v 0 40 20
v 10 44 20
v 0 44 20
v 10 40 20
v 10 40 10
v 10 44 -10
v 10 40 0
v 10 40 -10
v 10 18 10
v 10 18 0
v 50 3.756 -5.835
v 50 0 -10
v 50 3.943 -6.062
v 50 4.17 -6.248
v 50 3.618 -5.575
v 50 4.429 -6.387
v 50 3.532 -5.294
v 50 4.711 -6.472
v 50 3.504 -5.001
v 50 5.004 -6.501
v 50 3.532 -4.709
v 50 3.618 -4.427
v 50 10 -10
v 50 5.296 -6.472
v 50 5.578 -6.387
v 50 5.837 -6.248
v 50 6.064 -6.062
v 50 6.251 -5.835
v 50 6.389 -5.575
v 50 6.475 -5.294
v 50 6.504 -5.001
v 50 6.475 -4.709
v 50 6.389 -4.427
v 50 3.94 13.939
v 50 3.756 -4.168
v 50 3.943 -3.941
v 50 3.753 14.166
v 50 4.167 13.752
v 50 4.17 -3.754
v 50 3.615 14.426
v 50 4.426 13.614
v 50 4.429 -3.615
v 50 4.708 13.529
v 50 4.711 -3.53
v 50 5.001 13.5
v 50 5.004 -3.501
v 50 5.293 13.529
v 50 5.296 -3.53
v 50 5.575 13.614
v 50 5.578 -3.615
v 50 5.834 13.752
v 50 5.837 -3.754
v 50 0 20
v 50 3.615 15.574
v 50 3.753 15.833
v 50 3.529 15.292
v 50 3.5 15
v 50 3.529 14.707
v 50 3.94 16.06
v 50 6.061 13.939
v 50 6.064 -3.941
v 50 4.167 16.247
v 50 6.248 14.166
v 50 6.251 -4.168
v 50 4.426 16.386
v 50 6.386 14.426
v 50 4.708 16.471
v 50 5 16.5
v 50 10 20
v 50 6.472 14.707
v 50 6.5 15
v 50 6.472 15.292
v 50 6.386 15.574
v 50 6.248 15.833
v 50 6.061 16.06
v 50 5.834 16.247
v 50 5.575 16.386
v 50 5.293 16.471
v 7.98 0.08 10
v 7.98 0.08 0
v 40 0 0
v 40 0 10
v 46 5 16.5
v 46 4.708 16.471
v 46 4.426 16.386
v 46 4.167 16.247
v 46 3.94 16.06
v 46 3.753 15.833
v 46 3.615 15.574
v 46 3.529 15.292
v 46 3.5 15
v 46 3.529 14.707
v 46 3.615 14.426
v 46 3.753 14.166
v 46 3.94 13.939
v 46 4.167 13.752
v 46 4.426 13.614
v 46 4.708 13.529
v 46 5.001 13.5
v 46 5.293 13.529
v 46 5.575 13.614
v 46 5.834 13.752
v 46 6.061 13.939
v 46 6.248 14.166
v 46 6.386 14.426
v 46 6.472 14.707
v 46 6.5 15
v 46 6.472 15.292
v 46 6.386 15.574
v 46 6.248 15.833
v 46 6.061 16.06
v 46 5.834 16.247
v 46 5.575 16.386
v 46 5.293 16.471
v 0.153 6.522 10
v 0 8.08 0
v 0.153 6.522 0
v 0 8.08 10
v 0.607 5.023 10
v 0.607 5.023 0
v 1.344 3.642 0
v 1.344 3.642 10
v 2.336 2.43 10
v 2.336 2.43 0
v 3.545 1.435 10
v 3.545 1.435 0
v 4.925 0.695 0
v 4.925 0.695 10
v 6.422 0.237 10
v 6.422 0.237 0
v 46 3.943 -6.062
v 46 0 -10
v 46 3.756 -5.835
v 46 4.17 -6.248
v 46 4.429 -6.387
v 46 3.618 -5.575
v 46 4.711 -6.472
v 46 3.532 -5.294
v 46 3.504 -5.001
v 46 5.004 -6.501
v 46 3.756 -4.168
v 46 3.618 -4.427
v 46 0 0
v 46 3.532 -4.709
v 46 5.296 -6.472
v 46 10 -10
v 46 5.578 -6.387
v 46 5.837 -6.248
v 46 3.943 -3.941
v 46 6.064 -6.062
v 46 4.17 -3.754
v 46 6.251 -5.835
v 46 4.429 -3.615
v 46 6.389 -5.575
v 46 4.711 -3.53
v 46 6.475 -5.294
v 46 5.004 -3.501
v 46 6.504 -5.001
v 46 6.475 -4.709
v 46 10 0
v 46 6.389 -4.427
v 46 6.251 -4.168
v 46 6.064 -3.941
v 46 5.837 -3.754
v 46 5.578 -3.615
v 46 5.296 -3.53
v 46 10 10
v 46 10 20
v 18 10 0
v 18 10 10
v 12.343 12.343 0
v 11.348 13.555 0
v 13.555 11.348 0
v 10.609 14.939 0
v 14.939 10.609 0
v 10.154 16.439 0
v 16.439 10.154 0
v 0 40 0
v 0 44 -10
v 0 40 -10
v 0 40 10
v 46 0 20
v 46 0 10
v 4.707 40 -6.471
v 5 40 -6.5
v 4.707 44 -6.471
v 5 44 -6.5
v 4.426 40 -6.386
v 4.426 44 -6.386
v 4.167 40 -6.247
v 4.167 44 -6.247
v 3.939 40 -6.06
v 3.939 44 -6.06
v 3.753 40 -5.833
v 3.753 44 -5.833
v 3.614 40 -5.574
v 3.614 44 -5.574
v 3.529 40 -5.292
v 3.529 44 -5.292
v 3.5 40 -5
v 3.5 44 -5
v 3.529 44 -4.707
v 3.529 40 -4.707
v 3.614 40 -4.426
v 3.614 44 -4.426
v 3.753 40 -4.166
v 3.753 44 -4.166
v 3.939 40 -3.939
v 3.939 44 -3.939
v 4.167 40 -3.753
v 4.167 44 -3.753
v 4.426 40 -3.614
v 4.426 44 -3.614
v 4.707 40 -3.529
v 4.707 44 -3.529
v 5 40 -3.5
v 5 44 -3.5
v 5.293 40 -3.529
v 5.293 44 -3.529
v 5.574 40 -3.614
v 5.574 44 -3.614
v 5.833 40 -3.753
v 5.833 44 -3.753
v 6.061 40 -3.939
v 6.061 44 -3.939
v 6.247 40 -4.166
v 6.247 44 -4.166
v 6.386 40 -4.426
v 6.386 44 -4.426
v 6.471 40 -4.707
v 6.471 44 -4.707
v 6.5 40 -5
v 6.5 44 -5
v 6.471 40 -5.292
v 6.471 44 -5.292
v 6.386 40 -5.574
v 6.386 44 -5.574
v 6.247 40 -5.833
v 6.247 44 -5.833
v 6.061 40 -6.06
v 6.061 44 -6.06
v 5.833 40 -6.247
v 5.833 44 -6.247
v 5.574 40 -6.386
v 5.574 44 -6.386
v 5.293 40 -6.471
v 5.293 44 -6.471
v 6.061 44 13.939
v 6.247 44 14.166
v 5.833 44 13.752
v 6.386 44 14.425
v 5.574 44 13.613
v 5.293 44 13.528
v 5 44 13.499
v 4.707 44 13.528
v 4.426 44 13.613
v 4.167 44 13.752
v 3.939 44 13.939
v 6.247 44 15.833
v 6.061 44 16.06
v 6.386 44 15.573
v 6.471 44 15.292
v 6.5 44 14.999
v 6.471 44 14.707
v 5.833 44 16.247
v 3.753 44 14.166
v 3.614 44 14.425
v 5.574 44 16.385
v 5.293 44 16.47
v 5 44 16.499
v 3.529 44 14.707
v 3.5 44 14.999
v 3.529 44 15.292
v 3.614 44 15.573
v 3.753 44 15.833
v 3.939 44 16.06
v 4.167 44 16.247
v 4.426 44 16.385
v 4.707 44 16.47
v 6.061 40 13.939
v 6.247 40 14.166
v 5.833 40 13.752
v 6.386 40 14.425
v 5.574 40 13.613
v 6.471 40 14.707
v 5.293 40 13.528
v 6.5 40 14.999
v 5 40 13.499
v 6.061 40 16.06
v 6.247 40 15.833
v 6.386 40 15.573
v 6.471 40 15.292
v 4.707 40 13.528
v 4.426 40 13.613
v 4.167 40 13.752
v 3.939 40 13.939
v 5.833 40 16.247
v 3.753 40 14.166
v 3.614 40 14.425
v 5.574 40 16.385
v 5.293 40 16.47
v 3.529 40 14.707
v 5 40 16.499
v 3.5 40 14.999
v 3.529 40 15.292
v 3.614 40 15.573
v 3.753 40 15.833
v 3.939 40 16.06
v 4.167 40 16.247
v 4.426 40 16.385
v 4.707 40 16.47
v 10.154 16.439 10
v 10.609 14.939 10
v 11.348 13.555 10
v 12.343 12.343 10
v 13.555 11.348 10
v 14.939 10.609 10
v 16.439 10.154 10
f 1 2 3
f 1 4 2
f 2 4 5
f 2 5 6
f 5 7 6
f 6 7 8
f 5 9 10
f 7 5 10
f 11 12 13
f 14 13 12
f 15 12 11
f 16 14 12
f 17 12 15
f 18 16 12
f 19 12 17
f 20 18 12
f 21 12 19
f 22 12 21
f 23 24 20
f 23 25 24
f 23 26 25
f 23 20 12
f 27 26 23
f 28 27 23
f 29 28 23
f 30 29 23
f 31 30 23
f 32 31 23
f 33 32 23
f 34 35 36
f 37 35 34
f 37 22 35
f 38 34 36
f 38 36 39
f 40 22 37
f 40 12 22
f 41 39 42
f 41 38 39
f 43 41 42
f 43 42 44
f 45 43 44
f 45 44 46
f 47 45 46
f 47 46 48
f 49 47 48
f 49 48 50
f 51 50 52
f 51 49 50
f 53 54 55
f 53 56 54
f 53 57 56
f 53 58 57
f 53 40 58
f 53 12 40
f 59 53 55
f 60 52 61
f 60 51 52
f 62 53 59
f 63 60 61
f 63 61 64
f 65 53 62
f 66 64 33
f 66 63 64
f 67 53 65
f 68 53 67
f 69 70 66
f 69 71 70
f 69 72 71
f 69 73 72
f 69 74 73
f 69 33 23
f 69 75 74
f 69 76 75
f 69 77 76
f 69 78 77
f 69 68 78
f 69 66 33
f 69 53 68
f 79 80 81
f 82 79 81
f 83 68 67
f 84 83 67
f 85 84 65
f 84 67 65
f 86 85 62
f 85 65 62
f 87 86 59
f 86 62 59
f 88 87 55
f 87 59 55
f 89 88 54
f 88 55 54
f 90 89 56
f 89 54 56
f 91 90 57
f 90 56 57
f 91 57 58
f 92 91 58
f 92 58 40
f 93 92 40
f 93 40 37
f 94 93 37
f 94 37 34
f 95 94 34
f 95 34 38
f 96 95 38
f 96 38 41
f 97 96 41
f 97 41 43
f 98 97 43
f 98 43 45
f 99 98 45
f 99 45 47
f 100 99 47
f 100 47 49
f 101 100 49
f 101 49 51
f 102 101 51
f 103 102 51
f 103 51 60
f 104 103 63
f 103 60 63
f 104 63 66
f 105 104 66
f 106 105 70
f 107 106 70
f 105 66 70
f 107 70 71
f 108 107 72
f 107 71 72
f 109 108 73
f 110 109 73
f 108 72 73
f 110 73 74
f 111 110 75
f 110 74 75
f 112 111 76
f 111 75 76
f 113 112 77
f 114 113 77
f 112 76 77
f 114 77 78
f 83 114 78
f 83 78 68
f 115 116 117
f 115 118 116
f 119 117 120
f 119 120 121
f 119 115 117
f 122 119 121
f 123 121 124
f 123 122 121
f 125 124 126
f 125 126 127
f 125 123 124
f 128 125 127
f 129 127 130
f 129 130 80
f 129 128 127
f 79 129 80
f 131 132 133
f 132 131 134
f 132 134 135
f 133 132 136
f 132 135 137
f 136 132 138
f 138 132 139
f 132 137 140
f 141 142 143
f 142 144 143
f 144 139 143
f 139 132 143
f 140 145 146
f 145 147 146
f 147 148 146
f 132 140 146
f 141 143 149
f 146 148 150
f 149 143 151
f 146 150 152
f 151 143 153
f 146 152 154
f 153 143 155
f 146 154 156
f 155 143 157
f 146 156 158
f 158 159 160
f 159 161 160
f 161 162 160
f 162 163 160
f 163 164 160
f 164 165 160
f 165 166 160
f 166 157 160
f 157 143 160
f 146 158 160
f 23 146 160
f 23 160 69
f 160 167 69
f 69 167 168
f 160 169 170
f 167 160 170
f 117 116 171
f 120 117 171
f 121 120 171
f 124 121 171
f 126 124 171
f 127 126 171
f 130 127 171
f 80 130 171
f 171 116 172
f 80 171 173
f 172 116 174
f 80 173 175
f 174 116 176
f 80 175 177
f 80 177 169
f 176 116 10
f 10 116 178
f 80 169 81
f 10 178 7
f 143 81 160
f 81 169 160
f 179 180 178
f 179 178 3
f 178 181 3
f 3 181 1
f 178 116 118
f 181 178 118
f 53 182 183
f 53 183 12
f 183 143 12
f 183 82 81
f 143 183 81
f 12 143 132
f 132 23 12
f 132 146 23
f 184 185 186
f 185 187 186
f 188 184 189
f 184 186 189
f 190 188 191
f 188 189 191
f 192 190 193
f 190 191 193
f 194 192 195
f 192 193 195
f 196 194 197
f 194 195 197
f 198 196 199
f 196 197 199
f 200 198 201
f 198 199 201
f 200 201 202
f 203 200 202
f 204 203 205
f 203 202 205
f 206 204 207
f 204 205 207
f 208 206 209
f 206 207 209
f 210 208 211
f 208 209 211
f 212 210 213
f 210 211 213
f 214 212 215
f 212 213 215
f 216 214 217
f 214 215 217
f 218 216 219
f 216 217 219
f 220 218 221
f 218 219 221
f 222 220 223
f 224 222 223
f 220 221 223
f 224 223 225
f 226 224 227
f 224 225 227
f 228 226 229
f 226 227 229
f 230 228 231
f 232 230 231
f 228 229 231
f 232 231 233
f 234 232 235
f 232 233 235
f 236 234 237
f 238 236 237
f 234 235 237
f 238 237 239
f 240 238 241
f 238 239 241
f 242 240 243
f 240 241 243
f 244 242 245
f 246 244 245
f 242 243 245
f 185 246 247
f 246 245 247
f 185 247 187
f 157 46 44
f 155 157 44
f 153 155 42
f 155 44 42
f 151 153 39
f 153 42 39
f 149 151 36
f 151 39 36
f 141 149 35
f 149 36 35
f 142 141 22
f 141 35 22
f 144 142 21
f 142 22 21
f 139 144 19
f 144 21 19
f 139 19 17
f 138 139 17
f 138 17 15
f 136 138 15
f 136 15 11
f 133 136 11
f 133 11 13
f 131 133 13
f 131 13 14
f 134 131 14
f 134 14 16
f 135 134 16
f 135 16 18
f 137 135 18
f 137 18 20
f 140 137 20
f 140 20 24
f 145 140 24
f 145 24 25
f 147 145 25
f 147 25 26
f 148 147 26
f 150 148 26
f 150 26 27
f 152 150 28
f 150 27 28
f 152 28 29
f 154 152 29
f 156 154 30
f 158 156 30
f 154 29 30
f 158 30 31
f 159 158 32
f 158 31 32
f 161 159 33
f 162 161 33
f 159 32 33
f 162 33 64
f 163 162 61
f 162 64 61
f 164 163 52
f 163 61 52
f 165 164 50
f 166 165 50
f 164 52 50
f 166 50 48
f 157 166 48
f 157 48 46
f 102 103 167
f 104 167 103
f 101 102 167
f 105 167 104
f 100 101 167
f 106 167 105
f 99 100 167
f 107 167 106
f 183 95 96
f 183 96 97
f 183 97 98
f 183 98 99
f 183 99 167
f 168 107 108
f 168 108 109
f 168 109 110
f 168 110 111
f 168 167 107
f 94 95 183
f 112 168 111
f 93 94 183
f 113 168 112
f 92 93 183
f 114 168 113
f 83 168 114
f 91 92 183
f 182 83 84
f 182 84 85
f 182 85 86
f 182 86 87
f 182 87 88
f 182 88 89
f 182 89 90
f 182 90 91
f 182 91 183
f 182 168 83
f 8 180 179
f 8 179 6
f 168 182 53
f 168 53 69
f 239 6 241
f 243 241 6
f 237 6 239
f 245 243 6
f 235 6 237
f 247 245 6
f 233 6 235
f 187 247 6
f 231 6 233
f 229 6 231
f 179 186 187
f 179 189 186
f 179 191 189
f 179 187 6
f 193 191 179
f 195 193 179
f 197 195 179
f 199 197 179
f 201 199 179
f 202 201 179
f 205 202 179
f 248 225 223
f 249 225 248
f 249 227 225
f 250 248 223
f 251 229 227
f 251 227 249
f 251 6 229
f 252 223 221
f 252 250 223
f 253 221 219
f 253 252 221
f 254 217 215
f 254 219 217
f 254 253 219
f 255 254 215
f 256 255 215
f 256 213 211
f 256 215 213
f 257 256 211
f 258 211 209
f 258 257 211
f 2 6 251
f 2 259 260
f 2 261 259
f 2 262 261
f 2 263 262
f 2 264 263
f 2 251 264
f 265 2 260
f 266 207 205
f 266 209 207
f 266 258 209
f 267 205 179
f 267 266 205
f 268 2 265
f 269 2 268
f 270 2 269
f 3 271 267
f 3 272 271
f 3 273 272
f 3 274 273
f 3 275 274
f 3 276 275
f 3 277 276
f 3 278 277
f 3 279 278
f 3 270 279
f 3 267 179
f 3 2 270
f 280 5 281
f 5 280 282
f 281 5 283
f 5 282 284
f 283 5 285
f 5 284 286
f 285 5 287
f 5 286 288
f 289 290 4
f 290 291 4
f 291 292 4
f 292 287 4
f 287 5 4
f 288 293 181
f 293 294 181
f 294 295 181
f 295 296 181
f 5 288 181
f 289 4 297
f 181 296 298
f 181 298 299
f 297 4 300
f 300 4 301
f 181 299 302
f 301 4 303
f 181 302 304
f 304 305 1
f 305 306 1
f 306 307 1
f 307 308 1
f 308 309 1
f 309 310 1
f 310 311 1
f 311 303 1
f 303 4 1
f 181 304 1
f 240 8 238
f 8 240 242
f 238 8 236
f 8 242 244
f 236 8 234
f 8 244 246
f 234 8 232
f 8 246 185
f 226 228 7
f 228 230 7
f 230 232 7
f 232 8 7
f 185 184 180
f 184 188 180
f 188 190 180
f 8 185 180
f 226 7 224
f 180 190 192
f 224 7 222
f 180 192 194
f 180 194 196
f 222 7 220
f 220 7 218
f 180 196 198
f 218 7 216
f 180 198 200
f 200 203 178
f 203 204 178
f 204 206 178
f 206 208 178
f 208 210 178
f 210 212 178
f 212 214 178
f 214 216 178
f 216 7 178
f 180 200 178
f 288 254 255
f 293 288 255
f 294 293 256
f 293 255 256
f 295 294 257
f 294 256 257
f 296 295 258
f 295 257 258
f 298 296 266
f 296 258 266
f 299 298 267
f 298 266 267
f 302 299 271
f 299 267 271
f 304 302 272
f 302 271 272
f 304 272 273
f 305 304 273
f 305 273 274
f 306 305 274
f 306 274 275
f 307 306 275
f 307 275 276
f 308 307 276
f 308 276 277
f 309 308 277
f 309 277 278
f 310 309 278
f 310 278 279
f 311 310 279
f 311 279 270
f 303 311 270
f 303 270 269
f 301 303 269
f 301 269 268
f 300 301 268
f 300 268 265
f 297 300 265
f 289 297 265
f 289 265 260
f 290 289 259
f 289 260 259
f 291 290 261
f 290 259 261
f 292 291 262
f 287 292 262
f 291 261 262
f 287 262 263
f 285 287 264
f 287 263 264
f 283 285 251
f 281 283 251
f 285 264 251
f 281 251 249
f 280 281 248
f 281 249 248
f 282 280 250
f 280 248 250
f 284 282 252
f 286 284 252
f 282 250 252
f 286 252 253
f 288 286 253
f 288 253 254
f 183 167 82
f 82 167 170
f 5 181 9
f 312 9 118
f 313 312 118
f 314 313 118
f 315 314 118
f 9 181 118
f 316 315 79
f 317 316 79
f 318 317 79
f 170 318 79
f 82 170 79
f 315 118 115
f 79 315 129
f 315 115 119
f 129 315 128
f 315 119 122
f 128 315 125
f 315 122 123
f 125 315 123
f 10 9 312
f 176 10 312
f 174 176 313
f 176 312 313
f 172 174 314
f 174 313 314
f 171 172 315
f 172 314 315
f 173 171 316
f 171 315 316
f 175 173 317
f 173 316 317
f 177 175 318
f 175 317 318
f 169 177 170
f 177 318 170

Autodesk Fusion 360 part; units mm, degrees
sketch "Sketch1" plane through (0, 0, 0) normal (0, 0, 1) x (1, 0, 0)
  line L0 (0, 40) -> (10, 40)
  line L1 (10, 40) -> (10, 10)
  line L2 (0, 0) -> (0, 40)
  line L3 (40, 0) -> (40, 10)
  line L4 (40, 10) -> (10, 10)
  line L5 (0, 10) -> (0, 0)
  line L6 (0, 0.1) -> (40, 0)
  dimension "d1" = 10
  dimension "d2" = 40
  dimension "d3" = 40
  dimension "d4" = 10
extrude "Extrude1" add sketch "Sketch1" along normal blind 10
sketch "Sketch2" plane through (40, 0, 0) normal (1, 0, 0) x (0, 1, 0)
  line L0 (0, 0) -> (10, 0)
  line L1 (10, 0) -> (10, 10)
  line L2 (10, 10) -> (0, 10)
  line L3 (0, 10) -> (0, 0)
  line L4 (0, 20) -> (10, 20)
  line L5 (10, 20) -> (10, -10)
  line L6 (10, -10) -> (0, -10)
  line L7 (0, -10) -> (0, 20)
  dimension "d7" = 10
  dimension "d8" = 30
extrude "Extrude2" add sketch "Sketch2" along normal blind 10
sketch "Sketch3" plane through (40, 0, 0) normal (-1, 0, 0) x (0, -1, 0)
  line L0 (-10, 10) -> (0, 10)
  line L1 (0, 10) -> (0, 20)
  line L2 (0, 20) -> (-10, 20)
  line L3 (-10, 20) -> (-10, 10)
extrude "Extrude3" cut sketch "Sketch3" against normal blind 6
move_face "OffsetFaces1" offset -6 1 faces at (40, 3.3333, -6.6667)
sketch "Sketch4" plane through (0, 40, 0) normal (0, 1, 0) x (-1, 0, 0)
  line L0 (-10, 0) -> (0, 0)
  line L1 (0, 0) -> (0, 10)
  line L2 (0, 10) -> (-10, 10)
  line L3 (-10, 10) -> (-10, 0)
  line L4 (-10, 20) -> (0, 20)
  line L5 (0, 20) -> (0, -10)
  line L6 (0, -10) -> (-10, -10)
  line L7 (-10, -10) -> (-10, 20)
extrude "Extrude4" add sketch "Sketch4" along normal blind 4
fillet "Fillet1" radius 8 1 edges at (0, 0.1, 5)
fillet "Fillet2" radius 8 1 edges at (10, 10, 5)
hole "Hole1" at (5.0001, 40, 14.9993) direction (0, 1, 0) diameter 3 end through all
hole "Hole2" at (5.0001, 40, -4.9998) direction (0, 1, 0) diameter 3 end through all
hole "Hole3" at (46, 5.0035, -5.0012) direction (1, 0, 0) diameter 3 end through all
hole "Hole4" at (46, 5.0005, 14.9997) direction (1, 0, 0) diameter 3 end through all
